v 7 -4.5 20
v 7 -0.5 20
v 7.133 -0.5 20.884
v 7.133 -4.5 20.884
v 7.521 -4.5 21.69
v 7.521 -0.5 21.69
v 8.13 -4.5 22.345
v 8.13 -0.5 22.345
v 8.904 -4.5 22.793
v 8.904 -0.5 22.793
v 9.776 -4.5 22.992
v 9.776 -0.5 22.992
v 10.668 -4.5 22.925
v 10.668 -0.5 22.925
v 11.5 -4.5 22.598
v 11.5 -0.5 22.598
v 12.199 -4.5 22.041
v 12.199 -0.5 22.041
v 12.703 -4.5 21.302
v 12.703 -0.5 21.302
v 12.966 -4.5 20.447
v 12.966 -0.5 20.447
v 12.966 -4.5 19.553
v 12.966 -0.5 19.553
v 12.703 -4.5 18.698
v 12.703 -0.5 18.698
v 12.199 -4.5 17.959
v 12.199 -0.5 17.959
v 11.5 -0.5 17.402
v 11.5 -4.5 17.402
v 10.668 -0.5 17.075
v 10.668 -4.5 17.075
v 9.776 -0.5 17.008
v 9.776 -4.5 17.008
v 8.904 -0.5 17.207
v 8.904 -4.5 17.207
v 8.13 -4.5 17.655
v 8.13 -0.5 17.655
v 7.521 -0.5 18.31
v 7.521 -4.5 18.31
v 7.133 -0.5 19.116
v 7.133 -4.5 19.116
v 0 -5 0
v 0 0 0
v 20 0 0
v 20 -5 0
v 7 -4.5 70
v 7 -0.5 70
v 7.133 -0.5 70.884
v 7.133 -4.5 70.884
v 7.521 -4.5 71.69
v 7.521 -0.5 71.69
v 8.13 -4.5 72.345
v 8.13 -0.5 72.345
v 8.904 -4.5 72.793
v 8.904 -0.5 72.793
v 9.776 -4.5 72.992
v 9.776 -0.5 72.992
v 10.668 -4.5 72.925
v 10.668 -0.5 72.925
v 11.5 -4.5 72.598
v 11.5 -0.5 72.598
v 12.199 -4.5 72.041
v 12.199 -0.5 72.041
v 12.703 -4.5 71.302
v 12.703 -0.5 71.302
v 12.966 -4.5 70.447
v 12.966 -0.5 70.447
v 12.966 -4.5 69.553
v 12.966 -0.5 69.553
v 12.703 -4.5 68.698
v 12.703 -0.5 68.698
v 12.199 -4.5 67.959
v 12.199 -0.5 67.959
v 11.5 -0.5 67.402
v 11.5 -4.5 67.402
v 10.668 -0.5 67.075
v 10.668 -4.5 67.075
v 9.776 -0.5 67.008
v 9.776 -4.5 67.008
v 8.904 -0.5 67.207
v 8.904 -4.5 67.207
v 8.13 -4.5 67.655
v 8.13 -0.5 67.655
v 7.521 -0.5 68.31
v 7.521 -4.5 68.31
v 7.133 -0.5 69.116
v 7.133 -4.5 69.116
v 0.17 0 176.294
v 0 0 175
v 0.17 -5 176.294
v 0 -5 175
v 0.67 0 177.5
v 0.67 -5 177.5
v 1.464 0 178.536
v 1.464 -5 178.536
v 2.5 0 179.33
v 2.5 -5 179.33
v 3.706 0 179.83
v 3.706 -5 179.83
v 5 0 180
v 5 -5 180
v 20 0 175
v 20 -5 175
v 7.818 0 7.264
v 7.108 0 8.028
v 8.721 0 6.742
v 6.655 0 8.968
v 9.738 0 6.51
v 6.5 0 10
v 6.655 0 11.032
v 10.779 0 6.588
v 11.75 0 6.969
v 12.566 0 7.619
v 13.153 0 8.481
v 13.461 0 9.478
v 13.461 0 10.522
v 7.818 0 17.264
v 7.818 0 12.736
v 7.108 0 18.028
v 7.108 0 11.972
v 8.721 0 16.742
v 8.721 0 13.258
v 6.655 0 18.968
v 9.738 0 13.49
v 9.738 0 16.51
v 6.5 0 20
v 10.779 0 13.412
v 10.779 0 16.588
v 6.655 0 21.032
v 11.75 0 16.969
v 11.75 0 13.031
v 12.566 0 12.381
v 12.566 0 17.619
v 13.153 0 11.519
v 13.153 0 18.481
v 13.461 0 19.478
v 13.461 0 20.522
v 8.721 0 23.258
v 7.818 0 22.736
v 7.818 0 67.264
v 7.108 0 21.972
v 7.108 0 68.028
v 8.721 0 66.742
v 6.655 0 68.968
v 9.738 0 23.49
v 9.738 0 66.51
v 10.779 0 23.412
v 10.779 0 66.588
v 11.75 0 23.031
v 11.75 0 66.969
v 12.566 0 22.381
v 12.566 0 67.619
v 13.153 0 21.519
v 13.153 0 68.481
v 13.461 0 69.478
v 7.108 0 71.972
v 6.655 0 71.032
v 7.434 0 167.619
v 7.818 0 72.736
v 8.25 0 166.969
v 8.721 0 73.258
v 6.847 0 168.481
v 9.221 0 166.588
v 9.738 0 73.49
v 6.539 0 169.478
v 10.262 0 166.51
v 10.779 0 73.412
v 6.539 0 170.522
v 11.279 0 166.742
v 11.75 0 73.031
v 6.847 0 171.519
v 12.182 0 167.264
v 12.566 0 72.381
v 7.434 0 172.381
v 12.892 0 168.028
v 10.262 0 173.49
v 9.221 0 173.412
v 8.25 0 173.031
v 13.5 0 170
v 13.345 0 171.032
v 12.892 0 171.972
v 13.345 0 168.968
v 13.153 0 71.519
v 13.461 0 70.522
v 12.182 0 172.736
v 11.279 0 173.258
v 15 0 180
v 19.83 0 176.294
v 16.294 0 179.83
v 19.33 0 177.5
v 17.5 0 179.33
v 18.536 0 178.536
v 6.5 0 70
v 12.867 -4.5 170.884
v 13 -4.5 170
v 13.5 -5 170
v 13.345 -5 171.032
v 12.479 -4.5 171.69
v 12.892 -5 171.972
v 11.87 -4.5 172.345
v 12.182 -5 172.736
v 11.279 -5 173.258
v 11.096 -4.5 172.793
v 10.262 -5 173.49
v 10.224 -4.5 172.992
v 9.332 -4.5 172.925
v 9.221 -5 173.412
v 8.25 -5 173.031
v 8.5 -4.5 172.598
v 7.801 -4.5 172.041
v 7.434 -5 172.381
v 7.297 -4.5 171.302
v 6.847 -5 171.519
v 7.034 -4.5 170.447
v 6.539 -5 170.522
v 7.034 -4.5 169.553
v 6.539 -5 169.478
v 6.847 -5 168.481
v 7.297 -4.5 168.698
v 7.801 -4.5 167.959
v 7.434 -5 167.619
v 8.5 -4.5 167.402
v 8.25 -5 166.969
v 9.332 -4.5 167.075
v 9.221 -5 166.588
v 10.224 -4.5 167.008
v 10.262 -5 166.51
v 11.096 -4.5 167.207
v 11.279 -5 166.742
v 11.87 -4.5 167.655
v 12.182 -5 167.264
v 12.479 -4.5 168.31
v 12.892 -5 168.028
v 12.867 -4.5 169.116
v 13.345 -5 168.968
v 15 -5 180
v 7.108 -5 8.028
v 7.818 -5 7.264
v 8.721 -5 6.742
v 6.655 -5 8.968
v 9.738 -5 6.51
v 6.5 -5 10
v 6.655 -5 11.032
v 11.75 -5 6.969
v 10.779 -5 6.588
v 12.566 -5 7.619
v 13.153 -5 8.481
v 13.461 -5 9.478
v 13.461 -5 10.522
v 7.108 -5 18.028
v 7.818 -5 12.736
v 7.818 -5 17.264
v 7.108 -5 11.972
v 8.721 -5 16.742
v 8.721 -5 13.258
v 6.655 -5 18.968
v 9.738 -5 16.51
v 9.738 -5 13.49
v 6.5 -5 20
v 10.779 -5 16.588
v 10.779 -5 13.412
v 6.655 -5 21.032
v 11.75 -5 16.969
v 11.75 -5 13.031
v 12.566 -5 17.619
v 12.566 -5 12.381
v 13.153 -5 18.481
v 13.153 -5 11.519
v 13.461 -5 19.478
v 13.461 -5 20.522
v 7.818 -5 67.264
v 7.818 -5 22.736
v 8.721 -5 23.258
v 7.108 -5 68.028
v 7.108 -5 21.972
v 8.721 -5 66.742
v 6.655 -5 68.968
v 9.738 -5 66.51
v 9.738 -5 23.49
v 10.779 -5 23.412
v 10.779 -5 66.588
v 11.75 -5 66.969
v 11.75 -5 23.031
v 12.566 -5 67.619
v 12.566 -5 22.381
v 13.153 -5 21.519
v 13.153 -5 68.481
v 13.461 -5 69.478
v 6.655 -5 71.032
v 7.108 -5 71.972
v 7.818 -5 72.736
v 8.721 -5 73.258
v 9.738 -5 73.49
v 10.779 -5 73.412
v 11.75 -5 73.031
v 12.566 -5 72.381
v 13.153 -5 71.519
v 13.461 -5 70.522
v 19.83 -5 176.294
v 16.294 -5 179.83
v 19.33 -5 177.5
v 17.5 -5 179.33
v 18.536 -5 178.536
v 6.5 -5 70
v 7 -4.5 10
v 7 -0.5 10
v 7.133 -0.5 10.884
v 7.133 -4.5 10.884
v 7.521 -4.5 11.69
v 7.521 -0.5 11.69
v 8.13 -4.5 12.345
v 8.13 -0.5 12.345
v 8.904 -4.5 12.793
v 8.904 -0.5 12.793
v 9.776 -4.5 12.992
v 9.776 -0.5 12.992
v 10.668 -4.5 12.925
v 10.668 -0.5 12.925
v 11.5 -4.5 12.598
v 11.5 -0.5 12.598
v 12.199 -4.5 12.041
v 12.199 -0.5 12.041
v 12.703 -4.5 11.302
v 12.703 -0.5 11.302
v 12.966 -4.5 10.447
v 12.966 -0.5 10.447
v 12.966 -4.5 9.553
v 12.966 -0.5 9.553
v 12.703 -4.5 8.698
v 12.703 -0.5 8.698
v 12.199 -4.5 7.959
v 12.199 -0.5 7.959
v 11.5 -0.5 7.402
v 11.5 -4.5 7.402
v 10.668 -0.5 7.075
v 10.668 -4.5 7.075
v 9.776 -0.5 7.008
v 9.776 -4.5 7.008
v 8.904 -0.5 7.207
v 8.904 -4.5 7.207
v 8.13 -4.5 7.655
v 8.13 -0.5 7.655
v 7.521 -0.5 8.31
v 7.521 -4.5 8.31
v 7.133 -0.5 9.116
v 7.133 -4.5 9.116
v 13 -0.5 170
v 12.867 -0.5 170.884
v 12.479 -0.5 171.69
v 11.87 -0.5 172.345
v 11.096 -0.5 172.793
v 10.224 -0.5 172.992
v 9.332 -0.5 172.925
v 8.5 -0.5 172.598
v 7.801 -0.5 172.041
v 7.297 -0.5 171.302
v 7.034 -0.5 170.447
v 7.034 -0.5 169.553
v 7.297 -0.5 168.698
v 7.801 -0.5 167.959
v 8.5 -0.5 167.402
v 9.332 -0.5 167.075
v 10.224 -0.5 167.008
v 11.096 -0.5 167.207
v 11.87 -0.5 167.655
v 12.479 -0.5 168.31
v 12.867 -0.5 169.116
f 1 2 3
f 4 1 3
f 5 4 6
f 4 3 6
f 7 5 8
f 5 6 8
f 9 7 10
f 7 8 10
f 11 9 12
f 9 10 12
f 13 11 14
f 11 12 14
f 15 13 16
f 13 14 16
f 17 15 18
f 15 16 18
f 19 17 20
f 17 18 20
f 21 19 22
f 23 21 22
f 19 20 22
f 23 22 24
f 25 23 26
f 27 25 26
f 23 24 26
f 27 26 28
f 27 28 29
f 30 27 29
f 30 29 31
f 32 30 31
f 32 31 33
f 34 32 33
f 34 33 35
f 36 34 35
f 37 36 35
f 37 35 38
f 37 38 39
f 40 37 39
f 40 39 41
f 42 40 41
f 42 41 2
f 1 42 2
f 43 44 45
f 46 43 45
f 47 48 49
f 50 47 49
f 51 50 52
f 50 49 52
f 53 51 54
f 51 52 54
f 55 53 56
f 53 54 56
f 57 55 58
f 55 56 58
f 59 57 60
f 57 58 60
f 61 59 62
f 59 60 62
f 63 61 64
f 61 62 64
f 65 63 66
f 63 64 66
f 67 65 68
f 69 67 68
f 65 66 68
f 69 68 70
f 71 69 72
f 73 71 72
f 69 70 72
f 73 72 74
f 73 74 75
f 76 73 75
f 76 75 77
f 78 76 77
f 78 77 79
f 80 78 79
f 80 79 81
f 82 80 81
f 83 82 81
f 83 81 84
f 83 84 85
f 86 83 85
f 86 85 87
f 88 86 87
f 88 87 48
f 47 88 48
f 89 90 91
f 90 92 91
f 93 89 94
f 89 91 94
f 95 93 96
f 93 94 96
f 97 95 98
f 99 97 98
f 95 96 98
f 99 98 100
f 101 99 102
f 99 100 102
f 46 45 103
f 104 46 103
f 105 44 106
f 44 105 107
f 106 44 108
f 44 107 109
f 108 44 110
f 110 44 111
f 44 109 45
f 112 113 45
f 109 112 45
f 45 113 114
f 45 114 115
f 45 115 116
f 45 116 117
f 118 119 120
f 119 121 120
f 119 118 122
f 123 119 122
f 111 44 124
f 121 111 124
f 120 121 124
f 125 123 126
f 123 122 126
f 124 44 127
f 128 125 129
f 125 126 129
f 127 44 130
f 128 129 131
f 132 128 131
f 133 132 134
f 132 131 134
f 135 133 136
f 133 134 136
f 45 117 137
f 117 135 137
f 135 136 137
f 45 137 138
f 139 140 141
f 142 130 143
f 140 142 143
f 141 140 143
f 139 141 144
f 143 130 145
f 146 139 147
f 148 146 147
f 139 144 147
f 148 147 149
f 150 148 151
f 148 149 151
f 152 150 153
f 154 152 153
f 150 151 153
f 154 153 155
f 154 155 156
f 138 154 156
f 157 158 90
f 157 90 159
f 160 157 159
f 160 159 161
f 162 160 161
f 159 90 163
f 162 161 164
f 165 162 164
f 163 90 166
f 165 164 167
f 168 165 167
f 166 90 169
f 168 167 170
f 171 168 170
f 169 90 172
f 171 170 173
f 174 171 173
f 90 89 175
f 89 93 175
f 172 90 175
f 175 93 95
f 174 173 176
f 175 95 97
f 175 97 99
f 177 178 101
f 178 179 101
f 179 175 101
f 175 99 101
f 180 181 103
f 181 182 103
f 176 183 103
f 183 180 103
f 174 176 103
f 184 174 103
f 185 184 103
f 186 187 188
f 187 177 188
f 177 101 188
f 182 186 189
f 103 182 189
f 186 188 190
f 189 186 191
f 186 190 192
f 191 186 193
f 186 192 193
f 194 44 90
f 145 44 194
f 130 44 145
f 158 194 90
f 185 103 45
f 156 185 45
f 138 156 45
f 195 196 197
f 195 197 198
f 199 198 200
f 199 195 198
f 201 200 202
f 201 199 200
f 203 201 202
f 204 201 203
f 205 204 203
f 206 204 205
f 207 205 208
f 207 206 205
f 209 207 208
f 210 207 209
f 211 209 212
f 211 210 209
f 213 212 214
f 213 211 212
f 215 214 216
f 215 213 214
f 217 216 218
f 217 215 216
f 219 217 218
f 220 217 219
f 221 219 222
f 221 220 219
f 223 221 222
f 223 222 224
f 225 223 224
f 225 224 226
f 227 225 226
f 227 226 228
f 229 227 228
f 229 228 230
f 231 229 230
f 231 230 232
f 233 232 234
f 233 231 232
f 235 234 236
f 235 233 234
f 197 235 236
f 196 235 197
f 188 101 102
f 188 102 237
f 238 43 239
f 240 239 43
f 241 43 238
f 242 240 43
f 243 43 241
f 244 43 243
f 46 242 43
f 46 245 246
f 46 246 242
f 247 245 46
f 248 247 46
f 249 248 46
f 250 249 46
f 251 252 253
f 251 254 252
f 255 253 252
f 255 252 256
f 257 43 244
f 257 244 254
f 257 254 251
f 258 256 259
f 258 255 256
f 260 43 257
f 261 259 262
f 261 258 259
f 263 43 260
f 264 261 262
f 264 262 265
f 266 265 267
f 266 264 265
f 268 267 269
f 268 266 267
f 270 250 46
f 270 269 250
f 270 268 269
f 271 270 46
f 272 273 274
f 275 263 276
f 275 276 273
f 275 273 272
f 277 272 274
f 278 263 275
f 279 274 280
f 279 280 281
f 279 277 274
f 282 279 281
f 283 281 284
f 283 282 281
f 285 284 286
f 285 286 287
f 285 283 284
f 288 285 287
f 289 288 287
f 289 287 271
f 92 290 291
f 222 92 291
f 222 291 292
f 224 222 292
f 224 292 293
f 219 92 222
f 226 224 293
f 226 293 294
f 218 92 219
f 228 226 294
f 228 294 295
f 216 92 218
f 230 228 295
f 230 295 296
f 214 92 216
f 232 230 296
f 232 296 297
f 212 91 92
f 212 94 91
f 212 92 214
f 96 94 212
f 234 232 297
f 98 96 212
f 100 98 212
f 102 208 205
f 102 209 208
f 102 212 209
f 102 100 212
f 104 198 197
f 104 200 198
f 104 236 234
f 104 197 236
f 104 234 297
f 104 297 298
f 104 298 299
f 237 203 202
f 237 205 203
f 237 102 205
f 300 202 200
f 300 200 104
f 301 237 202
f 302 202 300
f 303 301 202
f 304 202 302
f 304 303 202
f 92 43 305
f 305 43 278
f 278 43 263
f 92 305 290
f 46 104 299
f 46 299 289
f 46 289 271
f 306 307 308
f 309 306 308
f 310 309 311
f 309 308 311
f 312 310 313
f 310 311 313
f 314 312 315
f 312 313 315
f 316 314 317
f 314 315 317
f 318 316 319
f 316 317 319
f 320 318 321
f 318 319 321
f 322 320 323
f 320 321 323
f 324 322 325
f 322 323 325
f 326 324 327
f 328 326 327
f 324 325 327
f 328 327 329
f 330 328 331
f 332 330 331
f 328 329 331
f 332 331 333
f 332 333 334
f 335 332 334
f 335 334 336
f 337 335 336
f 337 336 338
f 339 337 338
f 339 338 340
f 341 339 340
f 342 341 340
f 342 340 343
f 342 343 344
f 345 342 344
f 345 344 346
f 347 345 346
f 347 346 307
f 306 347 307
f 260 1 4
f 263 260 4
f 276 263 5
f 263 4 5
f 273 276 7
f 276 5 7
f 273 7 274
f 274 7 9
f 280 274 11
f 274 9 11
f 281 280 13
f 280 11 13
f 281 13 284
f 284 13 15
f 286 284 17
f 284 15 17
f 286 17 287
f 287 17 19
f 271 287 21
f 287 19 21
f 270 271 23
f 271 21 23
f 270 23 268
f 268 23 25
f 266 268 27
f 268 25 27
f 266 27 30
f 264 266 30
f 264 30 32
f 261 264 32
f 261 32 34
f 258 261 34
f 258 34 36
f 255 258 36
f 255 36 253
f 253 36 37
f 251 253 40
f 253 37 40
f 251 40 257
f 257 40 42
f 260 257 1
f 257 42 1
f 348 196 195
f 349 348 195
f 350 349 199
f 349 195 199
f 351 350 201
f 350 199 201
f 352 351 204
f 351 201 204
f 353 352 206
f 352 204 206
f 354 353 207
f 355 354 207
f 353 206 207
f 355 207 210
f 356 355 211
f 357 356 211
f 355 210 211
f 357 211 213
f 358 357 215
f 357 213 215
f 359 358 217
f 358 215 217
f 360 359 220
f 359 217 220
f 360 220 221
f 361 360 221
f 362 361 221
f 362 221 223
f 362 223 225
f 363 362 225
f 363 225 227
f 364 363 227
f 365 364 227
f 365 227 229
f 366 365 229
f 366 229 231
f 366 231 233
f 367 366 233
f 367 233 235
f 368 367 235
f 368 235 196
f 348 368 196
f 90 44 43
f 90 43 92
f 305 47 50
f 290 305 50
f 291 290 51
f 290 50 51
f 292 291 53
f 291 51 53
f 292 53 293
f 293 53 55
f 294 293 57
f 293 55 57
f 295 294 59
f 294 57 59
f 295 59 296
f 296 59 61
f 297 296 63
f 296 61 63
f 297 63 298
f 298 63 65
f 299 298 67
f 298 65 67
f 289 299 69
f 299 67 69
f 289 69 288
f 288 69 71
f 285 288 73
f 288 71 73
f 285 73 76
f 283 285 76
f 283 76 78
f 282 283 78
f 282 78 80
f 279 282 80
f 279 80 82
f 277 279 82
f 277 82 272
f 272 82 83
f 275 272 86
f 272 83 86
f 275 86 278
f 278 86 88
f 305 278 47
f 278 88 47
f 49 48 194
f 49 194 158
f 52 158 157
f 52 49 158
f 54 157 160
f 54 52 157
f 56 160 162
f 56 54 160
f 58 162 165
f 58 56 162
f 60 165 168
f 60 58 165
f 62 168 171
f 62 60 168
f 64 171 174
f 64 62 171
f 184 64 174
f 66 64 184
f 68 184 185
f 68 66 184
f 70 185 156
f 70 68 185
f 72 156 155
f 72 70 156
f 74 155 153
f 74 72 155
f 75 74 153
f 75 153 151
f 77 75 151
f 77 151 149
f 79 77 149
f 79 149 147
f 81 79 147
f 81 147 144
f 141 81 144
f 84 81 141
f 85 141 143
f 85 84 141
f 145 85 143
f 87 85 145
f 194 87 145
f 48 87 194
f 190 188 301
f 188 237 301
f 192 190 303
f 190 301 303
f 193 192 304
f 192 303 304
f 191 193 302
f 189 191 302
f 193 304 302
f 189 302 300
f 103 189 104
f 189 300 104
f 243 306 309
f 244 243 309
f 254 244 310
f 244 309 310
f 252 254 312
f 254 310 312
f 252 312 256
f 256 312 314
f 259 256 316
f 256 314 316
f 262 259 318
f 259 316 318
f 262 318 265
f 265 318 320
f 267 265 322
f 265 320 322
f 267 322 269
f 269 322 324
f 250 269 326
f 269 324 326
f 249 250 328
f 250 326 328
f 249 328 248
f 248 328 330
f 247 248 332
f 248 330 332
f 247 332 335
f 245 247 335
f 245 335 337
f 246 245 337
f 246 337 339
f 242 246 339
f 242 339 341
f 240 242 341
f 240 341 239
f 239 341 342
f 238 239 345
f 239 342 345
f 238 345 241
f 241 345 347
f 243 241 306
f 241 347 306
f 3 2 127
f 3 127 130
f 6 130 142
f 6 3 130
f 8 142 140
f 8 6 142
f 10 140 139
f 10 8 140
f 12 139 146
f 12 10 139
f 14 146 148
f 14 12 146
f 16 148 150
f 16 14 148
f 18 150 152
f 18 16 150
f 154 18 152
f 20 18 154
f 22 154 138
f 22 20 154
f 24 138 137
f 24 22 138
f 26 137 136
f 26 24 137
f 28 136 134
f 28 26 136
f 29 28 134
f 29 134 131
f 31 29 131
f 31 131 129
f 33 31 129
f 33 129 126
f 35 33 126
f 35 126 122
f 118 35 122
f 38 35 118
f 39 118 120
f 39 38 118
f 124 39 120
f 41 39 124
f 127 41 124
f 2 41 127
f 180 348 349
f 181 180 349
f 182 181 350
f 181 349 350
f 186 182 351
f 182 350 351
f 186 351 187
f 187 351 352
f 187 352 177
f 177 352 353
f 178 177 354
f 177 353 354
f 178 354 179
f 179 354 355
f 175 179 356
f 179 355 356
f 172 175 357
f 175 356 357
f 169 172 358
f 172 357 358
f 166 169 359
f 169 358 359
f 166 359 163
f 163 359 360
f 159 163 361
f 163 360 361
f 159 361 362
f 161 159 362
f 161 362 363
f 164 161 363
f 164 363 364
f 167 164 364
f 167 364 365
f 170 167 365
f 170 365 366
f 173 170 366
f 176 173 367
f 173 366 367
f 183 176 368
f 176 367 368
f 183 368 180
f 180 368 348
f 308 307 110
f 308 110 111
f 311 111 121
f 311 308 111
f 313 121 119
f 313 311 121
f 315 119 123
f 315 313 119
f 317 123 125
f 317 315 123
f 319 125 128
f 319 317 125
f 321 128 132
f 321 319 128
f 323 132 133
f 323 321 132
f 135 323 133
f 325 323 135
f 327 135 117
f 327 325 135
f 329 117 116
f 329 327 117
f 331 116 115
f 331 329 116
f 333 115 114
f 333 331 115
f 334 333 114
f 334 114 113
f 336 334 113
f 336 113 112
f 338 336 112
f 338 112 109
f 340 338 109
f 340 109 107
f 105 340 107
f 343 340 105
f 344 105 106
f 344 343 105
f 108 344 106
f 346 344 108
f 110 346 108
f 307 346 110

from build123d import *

# Parameters (mm, degrees)
F0_W     = 20
F0_H     = 180
F1_DEPTH = 5
F2_R     = 3
F3_DEPTH = 5.001
F5_D     = 6
F7_D     = 6
F8_SIZE  = 0.5
F9_R     = 5


with BuildPart() as f1:
    # F0 (on Front) → F1 (new body)
    with BuildSketch(Plane.XZ):
        with Locations((10, 90)):
            Rectangle(F0_W, F0_H)
    extrude(amount=F1_DEPTH)

    # F2 (on face) → F3 (cut, through all)
    with BuildSketch(Plane.XZ.offset(5)):
        with Locations((10, 170)):
            Circle(F2_R)
    extrude(amount=-F3_DEPTH, mode=Mode.SUBTRACT)

    # F5 (through all)
    with Locations(Plane.XZ.offset(5)):
        with Locations((10, 70)):
            Hole(F5_D / 2)

    # F7 (through all)
    with Locations(Plane.XZ.offset(5)):
        with Locations((10, 10), (10, 20)):
            Hole(F7_D / 2)

    # F8
    f8_edges = [f1.edges().sort_by_distance(p)[0] for p in [
        (7, -5, 170),
        (7, 0, 170),
        (7, 0, 10),
        (7, 0, 20),
        (7, 0, 70),
        (7, -5, 10),
        (7, -5, 20),
        (7, -5, 70),
    ]]
    chamfer(f8_edges, length=F8_SIZE)

    # F9
    f9_edges = [f1.edges().sort_by_distance(p)[0] for p in [
        (20, -2.5, 180),
        (0, -2.5, 180),
    ]]
    fillet(f9_edges, radius=F9_R)


solid = f1.part
